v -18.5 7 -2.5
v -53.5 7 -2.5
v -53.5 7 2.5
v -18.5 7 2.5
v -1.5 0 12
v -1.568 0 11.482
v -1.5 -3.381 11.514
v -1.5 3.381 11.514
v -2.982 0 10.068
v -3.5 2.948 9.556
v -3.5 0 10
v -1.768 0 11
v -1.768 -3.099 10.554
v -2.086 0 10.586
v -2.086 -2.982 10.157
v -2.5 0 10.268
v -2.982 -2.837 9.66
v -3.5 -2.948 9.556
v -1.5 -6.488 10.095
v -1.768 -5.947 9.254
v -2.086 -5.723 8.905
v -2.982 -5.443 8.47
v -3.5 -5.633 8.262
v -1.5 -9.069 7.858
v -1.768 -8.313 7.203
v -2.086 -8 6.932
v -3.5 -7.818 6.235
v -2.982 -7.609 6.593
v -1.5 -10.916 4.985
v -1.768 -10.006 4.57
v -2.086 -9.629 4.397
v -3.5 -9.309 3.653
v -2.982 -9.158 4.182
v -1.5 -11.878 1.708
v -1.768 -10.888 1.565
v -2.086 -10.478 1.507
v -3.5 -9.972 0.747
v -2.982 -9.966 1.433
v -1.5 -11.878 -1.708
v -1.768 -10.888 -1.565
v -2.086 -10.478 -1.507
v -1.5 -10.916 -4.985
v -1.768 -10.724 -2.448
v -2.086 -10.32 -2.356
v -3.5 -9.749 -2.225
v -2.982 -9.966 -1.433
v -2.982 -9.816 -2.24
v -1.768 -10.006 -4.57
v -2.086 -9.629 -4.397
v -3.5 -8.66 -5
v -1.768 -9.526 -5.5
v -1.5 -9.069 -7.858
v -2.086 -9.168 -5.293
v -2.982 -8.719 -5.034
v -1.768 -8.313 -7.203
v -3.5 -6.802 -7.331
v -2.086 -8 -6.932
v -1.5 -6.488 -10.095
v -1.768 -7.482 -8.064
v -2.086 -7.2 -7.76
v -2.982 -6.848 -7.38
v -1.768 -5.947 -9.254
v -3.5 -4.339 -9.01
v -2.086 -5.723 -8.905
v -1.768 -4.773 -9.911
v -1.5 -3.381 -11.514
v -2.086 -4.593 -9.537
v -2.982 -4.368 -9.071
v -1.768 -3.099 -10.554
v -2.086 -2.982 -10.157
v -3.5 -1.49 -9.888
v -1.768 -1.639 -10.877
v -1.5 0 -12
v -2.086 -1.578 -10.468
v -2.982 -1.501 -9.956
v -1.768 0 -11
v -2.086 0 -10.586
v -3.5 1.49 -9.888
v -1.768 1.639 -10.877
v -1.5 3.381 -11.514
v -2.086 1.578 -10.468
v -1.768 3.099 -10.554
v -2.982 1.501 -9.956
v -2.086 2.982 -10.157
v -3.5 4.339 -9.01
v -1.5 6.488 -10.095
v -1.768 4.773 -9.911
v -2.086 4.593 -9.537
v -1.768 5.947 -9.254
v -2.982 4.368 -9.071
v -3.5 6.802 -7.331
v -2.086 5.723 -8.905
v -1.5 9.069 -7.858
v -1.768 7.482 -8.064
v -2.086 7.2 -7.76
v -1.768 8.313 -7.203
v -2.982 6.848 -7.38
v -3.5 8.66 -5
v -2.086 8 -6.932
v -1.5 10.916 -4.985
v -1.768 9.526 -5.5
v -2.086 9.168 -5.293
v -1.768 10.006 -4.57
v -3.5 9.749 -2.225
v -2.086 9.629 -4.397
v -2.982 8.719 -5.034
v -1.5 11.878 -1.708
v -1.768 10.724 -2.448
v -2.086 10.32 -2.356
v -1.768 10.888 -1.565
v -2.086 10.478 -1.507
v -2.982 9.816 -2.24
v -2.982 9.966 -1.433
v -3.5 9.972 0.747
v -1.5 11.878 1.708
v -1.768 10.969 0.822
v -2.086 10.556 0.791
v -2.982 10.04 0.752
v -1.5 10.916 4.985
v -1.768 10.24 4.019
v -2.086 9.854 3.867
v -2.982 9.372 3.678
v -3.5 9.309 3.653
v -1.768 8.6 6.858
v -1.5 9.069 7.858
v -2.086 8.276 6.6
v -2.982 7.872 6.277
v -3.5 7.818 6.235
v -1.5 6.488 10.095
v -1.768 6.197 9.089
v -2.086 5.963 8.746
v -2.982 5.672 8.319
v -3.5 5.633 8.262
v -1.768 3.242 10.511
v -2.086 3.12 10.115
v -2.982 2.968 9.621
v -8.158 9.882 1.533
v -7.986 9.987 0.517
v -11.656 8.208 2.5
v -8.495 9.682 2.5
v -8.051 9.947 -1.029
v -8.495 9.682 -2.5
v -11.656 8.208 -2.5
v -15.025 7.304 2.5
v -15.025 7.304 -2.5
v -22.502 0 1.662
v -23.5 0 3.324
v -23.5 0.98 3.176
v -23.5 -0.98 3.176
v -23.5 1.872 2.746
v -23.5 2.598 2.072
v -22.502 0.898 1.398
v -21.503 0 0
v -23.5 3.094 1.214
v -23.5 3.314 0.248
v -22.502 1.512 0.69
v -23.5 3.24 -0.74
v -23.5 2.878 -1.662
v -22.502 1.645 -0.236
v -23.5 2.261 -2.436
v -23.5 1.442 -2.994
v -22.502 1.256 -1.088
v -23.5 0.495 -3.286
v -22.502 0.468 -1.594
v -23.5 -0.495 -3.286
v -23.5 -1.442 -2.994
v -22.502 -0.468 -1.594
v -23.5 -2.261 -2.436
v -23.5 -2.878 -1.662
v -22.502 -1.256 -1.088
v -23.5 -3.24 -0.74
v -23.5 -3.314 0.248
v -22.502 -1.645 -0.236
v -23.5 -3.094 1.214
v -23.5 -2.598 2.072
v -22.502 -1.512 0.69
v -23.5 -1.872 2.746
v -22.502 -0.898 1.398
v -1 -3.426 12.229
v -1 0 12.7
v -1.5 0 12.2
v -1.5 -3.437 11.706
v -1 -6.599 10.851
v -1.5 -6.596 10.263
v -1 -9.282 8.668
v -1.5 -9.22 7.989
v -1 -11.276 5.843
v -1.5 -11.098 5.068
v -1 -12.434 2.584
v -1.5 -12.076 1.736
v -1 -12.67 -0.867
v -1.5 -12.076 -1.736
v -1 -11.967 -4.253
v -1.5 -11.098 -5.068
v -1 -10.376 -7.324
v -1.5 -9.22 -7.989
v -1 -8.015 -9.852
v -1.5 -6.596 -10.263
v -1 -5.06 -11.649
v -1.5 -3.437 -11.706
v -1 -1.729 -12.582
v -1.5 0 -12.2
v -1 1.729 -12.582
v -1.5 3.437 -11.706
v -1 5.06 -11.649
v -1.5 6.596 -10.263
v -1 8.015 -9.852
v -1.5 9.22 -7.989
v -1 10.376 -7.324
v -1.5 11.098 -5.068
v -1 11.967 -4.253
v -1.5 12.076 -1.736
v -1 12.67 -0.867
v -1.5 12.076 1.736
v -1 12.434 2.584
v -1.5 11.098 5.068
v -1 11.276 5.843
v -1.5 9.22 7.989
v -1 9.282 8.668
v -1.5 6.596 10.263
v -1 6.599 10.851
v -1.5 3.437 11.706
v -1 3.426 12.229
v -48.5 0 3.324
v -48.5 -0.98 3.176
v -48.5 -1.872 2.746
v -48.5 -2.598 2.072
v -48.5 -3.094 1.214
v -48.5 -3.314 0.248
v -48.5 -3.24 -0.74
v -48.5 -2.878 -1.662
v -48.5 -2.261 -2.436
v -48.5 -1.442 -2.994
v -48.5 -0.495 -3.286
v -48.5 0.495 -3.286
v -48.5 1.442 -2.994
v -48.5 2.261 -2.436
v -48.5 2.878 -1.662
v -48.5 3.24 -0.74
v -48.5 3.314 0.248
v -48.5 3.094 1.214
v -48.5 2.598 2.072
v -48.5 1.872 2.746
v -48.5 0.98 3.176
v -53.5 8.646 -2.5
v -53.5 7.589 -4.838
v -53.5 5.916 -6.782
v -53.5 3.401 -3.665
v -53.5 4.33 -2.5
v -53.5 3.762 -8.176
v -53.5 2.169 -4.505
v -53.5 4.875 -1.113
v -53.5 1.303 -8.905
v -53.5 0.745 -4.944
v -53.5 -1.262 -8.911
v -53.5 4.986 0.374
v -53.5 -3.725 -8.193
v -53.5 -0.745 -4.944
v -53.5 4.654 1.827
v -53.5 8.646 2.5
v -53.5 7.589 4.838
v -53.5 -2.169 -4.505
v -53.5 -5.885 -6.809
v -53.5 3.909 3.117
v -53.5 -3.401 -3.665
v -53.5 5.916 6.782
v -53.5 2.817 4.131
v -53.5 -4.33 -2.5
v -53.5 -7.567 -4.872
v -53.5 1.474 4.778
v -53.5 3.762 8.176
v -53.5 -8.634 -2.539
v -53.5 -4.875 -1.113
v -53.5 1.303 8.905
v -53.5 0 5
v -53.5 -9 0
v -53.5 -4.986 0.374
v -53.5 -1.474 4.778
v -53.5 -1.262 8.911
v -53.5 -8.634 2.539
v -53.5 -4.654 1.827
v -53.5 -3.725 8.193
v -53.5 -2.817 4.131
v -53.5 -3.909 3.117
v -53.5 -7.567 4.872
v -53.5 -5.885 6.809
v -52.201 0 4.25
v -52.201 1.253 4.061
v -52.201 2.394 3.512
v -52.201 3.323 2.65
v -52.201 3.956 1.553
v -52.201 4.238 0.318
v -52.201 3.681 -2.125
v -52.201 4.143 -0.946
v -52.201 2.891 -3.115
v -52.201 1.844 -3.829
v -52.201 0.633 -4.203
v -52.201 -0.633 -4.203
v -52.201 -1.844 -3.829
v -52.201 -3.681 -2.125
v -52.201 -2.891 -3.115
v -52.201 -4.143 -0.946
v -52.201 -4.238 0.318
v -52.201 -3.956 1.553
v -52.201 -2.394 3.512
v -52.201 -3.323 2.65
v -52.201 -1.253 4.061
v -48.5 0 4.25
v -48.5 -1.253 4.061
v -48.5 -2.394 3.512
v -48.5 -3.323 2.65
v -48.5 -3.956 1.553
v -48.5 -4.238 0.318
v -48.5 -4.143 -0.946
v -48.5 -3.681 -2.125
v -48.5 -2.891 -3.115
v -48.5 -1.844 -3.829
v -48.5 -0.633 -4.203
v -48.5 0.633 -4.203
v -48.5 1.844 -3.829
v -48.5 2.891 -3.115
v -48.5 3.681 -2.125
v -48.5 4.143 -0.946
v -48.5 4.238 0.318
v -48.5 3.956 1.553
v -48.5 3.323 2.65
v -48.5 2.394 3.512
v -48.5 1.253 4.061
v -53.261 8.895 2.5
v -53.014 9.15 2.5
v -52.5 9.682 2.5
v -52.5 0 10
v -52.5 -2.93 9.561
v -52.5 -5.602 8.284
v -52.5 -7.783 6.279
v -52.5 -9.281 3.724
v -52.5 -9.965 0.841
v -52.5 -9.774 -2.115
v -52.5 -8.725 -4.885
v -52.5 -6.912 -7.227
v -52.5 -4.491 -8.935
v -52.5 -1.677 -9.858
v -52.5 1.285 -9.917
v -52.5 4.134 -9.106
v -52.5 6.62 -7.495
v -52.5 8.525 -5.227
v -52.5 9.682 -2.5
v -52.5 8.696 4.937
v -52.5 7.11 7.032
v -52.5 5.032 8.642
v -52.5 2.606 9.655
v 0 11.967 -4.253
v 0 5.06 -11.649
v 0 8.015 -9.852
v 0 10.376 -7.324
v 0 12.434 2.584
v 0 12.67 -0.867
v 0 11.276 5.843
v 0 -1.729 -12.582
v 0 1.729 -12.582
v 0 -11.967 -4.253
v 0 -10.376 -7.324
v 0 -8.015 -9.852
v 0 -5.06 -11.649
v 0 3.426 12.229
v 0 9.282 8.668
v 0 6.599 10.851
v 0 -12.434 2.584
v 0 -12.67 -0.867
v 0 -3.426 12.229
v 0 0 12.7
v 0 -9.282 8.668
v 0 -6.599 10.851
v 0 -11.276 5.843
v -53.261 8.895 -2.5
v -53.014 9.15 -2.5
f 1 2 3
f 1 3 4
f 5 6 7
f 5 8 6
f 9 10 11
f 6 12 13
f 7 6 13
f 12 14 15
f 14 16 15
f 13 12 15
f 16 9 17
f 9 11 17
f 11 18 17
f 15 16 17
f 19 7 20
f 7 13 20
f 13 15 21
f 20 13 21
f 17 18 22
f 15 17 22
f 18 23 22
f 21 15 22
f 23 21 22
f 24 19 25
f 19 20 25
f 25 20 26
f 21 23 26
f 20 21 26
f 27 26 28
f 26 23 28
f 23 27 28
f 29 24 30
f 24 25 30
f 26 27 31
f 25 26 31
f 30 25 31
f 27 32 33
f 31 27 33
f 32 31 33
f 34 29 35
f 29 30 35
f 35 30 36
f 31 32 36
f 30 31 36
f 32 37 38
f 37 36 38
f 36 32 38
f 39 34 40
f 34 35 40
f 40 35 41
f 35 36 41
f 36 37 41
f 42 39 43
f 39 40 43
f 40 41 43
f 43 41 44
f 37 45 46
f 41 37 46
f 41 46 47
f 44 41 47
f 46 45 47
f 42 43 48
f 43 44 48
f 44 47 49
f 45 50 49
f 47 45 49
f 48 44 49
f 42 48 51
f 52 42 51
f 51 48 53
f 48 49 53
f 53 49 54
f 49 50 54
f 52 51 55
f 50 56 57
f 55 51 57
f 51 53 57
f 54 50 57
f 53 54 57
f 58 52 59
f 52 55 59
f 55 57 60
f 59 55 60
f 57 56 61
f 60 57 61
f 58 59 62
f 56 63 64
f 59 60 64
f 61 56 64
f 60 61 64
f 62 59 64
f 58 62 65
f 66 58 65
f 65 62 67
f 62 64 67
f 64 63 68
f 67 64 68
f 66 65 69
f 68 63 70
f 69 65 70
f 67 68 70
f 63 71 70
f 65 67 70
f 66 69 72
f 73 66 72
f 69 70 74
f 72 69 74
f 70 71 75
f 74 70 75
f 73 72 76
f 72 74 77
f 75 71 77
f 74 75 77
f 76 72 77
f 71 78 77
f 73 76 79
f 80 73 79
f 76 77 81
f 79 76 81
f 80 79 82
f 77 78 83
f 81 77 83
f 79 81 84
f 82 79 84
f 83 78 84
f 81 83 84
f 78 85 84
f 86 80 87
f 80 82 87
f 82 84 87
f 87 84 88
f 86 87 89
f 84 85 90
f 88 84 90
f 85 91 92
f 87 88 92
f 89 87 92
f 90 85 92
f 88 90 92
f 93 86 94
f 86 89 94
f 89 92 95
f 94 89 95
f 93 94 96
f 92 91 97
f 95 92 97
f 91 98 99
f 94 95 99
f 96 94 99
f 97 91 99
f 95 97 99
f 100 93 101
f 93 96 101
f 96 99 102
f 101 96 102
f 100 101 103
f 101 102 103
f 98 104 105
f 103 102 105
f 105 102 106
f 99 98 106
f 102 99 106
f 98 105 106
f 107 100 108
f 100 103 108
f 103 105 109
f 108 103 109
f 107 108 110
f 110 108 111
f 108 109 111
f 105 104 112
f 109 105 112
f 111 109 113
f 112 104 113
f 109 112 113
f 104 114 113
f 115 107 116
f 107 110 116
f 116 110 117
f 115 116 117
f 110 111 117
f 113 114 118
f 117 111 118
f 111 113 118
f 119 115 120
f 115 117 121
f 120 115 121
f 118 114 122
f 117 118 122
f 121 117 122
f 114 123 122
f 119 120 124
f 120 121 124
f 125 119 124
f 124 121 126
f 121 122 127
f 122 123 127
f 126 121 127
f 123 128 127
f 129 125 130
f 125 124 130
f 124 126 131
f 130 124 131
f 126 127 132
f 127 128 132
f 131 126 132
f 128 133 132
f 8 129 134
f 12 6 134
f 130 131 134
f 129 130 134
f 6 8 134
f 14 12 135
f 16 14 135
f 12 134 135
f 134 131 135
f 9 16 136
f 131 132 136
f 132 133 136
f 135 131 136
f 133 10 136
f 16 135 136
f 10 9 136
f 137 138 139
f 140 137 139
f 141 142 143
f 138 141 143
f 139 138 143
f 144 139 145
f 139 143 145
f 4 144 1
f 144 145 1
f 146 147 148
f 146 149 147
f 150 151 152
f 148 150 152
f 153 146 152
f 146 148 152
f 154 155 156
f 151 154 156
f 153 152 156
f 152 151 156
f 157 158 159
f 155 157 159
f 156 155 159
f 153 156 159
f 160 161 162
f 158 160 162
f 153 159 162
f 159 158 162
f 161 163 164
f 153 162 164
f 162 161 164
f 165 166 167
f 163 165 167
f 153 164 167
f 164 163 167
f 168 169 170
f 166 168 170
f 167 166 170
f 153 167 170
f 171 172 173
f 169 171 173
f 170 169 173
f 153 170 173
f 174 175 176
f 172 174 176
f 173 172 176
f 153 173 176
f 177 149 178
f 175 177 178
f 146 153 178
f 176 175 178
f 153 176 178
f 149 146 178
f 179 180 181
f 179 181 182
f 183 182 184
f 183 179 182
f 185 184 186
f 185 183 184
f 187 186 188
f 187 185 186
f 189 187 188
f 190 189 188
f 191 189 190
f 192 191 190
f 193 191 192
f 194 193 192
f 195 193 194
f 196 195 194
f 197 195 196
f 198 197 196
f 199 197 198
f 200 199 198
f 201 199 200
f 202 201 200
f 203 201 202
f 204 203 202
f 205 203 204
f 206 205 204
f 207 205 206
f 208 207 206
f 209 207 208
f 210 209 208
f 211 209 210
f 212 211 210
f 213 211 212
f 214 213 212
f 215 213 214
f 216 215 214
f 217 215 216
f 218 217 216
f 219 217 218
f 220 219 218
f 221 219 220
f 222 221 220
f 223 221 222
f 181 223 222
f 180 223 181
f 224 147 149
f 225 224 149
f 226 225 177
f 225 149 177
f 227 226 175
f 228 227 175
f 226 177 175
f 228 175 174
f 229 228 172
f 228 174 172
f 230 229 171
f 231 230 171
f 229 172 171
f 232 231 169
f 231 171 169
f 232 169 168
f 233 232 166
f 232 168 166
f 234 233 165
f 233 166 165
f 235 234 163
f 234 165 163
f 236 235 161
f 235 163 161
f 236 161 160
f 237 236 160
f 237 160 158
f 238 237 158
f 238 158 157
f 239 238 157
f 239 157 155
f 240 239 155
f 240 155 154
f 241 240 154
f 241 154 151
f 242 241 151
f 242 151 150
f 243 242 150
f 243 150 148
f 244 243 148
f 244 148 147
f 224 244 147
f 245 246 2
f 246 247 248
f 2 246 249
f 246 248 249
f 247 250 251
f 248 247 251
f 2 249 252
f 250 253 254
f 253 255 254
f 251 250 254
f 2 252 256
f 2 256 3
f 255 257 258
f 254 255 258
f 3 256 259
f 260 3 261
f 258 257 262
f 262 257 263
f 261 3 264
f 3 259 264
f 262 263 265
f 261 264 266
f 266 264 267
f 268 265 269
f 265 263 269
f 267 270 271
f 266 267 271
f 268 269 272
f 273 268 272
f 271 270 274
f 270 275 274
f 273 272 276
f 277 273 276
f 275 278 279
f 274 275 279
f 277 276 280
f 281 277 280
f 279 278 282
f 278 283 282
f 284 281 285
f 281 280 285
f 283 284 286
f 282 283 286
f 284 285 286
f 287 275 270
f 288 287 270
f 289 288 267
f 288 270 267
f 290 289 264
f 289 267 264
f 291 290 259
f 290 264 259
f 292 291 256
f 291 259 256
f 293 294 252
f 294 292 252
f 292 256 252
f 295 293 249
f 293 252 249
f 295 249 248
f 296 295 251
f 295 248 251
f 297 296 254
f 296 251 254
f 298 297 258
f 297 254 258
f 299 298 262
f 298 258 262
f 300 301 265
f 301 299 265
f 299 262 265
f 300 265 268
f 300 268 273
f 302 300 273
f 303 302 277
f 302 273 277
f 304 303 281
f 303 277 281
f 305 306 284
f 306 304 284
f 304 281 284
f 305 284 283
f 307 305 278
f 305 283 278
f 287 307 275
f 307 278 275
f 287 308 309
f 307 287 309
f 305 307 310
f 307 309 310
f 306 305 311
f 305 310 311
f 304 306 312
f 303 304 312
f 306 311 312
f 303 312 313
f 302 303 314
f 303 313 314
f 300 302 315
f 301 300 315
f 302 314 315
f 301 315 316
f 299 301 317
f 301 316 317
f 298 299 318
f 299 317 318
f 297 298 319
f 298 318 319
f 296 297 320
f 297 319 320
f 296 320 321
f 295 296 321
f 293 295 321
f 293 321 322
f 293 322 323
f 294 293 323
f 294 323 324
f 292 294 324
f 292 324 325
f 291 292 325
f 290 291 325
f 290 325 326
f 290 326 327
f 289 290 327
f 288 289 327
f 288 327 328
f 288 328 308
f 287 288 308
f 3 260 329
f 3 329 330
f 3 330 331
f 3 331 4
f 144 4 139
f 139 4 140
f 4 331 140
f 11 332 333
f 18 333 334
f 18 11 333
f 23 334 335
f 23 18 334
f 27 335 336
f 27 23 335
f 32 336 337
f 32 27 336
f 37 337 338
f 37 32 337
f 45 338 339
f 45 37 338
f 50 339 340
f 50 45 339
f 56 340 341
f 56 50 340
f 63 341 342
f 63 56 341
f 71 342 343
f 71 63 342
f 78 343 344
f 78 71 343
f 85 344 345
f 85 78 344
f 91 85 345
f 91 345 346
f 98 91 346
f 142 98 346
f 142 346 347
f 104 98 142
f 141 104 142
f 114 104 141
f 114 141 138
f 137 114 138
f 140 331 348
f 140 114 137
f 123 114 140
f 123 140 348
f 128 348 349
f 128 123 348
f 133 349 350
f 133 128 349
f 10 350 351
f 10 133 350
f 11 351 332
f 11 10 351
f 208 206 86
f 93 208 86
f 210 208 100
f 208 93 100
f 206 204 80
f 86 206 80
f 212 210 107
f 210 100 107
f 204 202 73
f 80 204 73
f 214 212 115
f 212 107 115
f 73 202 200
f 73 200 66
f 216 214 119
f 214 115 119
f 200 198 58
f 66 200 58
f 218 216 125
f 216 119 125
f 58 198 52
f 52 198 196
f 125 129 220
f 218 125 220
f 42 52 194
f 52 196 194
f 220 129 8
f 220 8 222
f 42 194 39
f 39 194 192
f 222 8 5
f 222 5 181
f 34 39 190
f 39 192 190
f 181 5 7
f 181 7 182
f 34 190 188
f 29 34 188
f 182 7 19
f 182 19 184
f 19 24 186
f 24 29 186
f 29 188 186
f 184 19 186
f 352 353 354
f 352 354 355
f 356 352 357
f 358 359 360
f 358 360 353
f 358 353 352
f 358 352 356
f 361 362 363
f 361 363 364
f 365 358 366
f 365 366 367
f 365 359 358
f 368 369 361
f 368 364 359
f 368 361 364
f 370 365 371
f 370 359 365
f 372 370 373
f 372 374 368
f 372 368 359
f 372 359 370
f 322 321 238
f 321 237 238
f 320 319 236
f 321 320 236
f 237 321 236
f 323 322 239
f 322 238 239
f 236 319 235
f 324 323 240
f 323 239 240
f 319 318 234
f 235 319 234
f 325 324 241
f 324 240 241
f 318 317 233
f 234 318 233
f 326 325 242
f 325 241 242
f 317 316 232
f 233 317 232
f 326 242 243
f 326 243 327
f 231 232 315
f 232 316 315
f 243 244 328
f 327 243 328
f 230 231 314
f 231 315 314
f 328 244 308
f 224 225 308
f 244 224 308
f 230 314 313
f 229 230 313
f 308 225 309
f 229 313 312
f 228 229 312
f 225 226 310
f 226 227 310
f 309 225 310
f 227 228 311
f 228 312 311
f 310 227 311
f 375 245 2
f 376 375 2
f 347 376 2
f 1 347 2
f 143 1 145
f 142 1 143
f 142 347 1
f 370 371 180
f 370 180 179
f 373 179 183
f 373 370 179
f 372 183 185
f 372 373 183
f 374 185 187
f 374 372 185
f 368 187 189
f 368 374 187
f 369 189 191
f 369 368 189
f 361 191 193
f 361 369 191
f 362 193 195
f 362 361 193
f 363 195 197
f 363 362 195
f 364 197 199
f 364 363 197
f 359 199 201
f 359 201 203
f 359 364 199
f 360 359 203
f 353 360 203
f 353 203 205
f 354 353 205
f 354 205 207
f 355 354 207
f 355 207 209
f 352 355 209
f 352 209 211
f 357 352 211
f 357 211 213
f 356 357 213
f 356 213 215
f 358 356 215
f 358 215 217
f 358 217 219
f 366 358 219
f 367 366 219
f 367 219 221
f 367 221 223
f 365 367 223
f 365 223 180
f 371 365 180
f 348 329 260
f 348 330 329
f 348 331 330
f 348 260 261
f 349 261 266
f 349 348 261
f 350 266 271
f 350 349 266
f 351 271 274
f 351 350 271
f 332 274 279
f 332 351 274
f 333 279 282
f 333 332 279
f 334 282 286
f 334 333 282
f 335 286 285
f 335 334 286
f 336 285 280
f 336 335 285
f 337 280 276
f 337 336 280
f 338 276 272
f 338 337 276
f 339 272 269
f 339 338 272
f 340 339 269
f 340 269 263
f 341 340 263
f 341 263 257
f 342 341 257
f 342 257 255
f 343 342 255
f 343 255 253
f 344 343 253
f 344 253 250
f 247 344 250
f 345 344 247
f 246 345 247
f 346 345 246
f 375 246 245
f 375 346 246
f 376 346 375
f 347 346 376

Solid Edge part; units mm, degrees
sketch "Sketch1" plane through (0, 0, 0) normal (0, -1, 0) x (1, 0, 0)
  line L0 (-53.5, 0) -> (-53.5, 9)
  line L1 (-53.5, 9) -> (-52.5, 10)
  line L2 (-52.5, 10) -> (-3.5, 10)
  arc A0 (-1.5, 12) -> (-3.5, 10) centre (-3.5, 12) cw
  line L3 (-1.5, 12) -> (-1.5, 12.2)
  line L4 (-1, 12.7) -> (-1.5, 12.2)
  line L5 (-1, 12.7) -> (0, 12.7)
  line L6 (0, 12.7) -> (0, 0)
  line L7 (-53.5, 0) -> (0, 0)
  dimension "D1" = 1
  dimension "D2" = 1
  dimension "D3" = 0.5
  dimension "D4" = 0.5
  dimension "D5" = 2
  dimension "D6" = 53.5
  dimension "D7" = 50
revolve "RevolvedProtrusion1" add sketch "Sketch1" angle 360 about axis through (-60, 0, 0) along (1, 0, 0)
sketch "Sketch2" plane through (0, 0, 0) normal (0, 0, 1) x (1, 0, 0)
  line L0 (-53.5, 7) -> (-18.5, 7)
  arc A0 (-18.5, 7) -> (-5.2712, 12) centre (-18.5, 27) ccw
  line L1 (-5.2712, 12) -> (-53.5, 12)
  line L2 (-53.5, 12) -> (-53.5, 7)
  dimension "D1" = 35
  dimension "D2" = 20
  dimension "D3" = 22
  dimension "D4" = 17
extrude "Cutout1" cut sketch "Sketch2" along normal mid plane 5
hole "Thread_Hole" at (-53.5, 0, 0) direction (1, 0, 0) diameter 6.647 depth 30 tip angle 118 thread major 8 thread length 23
hole "Countersink_Hole" at (-53.5, 0, 0) direction (1, 0, 0) diameter 8.5 depth 5 countersink diameter 10 countersink angle 60
properties material "Steel"
